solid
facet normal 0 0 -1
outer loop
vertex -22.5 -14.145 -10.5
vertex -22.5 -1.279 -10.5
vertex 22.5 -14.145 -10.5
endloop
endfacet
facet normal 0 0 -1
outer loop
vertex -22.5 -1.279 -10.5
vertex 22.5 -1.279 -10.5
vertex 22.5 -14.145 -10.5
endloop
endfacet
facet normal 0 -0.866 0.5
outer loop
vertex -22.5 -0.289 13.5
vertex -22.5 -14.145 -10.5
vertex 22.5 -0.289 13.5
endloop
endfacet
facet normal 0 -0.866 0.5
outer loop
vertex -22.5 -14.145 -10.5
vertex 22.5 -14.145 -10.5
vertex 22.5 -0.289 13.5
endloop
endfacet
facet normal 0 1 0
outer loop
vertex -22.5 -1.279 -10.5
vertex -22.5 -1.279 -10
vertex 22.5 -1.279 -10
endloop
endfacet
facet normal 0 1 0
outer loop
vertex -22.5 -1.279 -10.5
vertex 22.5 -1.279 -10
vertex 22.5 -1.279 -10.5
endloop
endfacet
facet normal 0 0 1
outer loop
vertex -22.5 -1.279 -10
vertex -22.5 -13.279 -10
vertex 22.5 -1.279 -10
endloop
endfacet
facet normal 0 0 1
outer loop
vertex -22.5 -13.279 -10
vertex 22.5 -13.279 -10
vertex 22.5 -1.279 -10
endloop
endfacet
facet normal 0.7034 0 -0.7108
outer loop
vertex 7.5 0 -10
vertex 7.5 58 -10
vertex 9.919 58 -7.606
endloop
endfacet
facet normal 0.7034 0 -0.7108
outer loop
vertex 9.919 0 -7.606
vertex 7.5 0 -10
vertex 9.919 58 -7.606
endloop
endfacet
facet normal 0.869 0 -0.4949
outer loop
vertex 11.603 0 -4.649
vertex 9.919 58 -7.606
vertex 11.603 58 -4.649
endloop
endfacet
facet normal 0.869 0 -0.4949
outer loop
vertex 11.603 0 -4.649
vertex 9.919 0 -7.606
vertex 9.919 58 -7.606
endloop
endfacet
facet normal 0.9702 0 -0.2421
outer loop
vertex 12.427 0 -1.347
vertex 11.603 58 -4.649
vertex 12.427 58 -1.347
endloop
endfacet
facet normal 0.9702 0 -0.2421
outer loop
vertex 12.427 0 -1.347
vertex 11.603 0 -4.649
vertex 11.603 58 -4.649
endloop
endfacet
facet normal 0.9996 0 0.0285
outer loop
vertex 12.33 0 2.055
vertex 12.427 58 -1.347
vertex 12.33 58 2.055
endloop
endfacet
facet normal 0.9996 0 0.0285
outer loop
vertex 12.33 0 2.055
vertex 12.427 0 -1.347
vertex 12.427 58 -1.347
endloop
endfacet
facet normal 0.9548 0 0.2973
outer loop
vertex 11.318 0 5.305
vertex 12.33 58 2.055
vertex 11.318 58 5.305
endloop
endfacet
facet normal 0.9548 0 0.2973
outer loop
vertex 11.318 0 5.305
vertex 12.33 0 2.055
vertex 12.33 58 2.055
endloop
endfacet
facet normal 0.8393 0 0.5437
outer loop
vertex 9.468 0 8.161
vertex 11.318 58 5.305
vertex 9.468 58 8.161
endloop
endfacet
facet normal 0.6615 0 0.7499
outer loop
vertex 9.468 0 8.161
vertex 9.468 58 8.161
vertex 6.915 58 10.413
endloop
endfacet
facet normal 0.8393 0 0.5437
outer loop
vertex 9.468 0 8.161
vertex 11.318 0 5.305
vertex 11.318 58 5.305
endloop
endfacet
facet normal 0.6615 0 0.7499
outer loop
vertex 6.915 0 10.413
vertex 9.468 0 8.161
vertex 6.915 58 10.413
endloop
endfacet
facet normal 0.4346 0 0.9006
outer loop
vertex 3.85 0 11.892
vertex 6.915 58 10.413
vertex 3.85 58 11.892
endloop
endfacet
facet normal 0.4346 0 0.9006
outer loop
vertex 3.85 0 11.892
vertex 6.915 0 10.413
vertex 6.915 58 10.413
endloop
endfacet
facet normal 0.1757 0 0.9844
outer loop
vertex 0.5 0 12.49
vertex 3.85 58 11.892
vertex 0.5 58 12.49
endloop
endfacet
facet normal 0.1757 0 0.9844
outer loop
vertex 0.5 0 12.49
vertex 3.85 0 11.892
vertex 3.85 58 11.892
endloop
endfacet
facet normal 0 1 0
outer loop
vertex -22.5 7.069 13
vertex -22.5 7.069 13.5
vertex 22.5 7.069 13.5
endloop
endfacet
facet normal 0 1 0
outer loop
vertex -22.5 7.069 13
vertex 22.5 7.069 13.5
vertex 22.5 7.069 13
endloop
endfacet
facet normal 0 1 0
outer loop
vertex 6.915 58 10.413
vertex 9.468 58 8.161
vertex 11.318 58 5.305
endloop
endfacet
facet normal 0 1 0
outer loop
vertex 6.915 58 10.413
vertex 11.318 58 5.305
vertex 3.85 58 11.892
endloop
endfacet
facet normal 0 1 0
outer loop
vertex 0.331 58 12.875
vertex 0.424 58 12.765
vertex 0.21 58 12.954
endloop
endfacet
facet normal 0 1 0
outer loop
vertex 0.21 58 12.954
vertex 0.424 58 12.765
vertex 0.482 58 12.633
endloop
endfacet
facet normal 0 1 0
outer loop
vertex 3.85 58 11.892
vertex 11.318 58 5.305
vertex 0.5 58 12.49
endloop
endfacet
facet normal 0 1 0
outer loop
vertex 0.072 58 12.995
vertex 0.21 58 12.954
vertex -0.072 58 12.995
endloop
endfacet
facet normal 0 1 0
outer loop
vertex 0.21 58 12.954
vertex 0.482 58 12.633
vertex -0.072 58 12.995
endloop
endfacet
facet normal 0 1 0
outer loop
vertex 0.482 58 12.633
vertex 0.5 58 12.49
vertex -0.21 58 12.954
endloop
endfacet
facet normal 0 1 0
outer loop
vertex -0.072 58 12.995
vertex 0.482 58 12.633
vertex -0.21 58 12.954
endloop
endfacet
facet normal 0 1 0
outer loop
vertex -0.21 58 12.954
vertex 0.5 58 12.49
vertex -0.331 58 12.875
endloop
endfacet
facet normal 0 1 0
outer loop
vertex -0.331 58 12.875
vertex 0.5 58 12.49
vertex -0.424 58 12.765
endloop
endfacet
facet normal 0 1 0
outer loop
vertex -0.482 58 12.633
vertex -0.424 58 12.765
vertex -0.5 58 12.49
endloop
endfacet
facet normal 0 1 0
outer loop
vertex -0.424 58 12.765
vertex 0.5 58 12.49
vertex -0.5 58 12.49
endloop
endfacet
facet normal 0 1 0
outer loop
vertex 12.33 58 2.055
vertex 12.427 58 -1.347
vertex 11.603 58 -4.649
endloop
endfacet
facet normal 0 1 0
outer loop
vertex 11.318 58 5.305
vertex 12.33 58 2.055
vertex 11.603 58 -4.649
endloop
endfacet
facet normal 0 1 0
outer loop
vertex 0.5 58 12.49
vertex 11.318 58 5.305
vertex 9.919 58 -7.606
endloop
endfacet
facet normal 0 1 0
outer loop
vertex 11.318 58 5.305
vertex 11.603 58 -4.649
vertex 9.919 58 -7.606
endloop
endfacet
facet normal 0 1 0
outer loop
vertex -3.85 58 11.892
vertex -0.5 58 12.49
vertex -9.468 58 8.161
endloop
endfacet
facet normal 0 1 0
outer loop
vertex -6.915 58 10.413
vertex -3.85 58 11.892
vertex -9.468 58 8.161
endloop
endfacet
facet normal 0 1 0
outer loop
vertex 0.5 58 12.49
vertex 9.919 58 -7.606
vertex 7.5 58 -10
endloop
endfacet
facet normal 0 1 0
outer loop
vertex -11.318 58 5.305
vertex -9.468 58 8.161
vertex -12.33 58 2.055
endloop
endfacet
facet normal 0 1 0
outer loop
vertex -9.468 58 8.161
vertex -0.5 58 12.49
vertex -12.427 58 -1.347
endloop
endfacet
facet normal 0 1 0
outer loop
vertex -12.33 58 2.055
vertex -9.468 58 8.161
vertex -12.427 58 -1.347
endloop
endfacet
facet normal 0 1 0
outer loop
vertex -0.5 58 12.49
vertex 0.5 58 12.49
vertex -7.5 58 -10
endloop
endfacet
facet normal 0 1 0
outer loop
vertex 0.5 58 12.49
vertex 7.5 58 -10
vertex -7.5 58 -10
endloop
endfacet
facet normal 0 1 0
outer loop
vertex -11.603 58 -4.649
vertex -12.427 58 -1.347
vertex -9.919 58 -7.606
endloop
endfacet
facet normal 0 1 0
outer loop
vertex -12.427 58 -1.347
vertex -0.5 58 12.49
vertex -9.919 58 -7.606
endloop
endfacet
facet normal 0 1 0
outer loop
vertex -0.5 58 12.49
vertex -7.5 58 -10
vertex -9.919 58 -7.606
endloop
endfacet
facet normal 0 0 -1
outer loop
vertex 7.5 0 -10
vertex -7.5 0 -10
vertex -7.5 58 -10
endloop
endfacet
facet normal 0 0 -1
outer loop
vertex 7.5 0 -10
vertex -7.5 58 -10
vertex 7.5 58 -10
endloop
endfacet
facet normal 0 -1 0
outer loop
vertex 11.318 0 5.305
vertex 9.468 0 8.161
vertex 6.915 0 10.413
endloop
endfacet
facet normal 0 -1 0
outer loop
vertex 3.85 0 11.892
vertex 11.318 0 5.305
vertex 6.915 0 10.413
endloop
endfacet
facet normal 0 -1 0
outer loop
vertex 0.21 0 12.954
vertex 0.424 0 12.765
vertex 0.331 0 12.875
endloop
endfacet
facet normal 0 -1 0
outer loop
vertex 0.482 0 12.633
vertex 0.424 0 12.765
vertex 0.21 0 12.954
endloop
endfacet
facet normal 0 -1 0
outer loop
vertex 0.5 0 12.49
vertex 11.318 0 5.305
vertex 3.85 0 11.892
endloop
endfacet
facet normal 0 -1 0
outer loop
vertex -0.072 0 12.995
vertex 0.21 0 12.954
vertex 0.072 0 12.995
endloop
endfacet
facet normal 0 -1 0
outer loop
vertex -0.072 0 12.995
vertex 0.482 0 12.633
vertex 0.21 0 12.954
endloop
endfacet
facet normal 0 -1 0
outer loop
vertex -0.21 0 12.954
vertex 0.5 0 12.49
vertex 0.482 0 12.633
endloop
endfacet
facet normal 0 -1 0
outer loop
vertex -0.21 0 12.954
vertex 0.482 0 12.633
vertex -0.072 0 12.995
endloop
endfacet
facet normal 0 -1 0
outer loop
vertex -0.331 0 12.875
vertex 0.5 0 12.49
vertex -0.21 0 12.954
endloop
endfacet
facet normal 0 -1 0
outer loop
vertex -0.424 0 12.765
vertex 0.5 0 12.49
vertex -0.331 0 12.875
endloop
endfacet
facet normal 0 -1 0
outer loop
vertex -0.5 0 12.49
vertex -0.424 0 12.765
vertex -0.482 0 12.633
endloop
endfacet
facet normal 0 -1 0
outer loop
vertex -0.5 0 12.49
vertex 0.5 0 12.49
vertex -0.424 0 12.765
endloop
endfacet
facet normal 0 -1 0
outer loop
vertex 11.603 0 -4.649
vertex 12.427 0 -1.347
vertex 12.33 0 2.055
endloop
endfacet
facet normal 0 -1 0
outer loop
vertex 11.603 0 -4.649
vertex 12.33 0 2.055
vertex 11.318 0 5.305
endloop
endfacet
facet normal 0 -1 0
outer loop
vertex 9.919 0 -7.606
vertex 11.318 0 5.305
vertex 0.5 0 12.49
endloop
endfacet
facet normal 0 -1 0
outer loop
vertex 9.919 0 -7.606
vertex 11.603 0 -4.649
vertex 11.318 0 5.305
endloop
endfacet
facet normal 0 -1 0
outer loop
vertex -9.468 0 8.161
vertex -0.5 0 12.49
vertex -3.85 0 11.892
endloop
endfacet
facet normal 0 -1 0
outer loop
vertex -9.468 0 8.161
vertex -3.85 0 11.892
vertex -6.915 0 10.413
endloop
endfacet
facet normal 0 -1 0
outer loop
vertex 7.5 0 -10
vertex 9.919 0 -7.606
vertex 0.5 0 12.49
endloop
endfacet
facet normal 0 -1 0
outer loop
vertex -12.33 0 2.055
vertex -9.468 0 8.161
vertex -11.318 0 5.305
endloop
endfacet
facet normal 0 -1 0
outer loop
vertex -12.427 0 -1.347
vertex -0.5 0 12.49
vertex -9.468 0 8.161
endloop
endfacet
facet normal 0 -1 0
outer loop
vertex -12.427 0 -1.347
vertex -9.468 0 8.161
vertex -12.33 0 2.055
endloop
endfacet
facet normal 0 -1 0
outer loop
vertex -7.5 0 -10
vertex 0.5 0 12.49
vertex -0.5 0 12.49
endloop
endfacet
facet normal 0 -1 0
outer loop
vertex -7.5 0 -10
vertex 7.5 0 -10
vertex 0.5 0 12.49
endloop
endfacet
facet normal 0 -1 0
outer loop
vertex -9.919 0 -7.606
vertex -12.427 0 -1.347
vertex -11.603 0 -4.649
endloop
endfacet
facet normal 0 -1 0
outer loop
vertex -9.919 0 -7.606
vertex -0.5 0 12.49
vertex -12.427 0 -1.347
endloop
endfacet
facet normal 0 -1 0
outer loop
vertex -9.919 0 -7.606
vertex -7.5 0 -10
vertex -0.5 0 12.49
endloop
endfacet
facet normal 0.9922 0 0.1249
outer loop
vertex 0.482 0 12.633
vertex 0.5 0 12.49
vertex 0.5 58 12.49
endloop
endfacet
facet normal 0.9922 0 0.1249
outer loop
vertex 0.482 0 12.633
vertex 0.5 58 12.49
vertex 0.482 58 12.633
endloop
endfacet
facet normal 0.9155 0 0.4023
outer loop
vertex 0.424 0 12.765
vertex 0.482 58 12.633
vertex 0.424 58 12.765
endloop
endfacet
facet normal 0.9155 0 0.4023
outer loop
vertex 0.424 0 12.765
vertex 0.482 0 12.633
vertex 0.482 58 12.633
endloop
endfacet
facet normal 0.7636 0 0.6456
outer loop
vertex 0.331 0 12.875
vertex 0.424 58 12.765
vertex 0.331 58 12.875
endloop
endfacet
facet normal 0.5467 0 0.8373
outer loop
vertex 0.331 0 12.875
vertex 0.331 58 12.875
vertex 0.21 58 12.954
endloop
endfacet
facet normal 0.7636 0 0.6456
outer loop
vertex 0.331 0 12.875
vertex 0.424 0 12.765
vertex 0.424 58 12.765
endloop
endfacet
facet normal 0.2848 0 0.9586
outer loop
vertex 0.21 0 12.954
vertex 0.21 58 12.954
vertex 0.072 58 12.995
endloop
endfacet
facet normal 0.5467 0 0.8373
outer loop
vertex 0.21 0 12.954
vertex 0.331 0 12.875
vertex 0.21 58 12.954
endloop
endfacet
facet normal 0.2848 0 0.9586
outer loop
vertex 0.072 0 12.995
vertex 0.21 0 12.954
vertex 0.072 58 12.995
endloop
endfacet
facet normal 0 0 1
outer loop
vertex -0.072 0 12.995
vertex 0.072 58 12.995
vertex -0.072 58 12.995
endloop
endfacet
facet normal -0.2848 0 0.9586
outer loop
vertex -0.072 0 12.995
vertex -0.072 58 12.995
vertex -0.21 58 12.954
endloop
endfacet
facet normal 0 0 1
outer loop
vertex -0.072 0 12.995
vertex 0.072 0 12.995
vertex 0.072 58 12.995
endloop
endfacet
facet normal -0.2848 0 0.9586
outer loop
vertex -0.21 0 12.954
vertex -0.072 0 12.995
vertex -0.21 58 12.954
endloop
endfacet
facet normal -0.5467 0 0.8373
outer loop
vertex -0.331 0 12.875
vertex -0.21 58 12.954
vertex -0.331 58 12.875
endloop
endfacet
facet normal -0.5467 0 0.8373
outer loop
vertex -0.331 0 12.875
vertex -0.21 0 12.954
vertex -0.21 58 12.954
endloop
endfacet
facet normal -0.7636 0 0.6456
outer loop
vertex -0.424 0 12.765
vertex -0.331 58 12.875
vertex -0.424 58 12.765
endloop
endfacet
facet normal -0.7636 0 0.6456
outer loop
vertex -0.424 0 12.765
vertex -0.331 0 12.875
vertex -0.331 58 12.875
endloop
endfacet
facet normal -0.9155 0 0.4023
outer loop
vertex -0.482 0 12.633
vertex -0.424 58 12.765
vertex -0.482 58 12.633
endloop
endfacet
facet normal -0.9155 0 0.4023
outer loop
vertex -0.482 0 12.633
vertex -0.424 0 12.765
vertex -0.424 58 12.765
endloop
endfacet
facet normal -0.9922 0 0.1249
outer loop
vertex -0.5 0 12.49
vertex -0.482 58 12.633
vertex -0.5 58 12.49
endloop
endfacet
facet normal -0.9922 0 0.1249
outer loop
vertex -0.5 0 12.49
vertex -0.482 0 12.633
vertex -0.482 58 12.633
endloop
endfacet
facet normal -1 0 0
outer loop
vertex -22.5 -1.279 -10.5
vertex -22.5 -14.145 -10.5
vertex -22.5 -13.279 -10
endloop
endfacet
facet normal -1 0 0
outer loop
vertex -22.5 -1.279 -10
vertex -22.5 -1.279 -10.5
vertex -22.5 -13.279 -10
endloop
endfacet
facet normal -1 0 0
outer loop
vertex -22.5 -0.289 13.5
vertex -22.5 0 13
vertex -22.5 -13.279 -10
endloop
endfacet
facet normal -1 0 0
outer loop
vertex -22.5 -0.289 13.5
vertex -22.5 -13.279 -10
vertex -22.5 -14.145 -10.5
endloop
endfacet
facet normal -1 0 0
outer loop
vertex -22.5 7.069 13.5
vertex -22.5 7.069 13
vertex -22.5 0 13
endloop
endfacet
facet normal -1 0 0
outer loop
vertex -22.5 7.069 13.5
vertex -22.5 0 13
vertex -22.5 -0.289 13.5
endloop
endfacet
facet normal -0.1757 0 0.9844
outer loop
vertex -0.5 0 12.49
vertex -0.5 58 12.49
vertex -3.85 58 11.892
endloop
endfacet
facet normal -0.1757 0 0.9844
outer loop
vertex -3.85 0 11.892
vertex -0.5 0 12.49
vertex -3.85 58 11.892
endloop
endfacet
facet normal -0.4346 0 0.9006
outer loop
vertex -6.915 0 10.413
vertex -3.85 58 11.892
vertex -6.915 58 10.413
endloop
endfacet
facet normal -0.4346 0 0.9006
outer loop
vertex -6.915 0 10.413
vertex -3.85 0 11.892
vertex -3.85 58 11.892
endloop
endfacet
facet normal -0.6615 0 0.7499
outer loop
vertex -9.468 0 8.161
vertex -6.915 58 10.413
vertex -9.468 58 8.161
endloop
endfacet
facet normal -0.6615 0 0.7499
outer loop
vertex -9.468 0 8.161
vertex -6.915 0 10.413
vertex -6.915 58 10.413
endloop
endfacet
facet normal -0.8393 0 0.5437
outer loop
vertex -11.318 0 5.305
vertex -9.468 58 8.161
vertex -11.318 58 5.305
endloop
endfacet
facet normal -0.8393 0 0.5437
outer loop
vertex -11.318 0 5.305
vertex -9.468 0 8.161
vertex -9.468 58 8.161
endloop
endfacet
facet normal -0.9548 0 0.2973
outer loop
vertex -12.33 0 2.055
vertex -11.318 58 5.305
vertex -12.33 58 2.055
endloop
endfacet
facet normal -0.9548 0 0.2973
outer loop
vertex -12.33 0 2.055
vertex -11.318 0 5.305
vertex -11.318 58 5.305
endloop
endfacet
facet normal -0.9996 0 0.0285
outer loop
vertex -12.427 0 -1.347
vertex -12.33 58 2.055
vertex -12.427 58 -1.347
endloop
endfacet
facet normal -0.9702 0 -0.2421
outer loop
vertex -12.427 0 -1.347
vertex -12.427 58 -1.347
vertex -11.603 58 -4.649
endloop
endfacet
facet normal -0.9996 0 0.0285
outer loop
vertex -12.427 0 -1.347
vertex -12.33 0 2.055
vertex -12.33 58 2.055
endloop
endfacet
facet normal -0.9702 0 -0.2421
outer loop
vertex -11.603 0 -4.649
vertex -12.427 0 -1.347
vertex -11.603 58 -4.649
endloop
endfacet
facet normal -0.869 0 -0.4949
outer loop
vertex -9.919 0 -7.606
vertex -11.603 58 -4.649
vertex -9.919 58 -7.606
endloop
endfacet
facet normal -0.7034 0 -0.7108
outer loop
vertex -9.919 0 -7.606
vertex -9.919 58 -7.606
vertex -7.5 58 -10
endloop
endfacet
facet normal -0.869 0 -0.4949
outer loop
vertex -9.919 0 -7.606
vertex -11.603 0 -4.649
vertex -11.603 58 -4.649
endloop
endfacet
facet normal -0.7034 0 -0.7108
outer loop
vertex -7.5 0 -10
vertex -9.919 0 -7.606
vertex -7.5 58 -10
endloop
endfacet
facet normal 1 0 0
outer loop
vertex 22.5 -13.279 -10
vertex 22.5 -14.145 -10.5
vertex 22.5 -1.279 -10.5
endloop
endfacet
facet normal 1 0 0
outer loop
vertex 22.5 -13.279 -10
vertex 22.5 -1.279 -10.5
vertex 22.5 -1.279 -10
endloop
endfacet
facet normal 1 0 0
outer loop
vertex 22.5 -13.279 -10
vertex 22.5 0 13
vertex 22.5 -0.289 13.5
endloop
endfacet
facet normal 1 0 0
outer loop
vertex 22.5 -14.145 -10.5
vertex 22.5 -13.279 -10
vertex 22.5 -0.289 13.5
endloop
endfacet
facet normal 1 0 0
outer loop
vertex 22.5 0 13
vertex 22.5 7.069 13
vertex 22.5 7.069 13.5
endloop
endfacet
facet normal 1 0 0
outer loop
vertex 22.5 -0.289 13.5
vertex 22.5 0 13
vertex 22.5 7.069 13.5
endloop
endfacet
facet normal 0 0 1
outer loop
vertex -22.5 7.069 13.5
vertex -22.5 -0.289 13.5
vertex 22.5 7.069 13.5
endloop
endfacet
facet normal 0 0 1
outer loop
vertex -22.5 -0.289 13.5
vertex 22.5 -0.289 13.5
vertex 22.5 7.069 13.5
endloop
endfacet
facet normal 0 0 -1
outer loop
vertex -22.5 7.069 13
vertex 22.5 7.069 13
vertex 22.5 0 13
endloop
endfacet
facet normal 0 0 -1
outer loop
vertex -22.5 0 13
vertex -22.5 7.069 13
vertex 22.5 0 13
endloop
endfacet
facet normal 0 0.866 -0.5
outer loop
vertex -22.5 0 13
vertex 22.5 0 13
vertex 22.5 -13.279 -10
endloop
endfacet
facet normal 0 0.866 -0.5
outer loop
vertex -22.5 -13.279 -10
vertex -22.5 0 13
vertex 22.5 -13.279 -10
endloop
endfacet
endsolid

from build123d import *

# Parameters (mm, degrees)
EXTRUDE_1_DEPTH = 58
EXTRUDE_2_DEPTH = 22.5


with BuildPart() as part:
    # 草图1 → 凸台-拉伸1 (new body)
    with BuildSketch(Plane(origin=(0, 0, 0), x_dir=(1, 0, 0), z_dir=(0, 1, 0))):
        with BuildLine():
            Line((-7.5, 10), (7.5, 10))
            ThreePointArc((7.5, 10), (11.935226222, -3.714885602), (0.49989999, -12.49))
            ThreePointArc((0.49989999, -12.49), (0, -13), (-0.49989999, -12.49))
            ThreePointArc((-0.49989999, -12.49), (-11.935226222, -3.714885602), (-7.5, 10))
        make_face()
    extrude(amount=EXTRUDE_1_DEPTH)


with BuildPart() as body_2:
    # 草图2 → 凸台-拉伸2 (new, symmetric)
    with BuildSketch(Plane(origin=(0, 0, 0), x_dir=(0, 0, -1), z_dir=(1, 0, 0))):
        Polygon((-13, 0), (10, -13.279056191), (10, -1.279056191), (10.5, -1.279056191), (10.5, -14.145081595), (-13.5, -0.288675135), (-13.5, 7.068703683), (-13, 7.068703683), align=None)
    extrude(amount=EXTRUDE_2_DEPTH, both=True)


solid = Compound([part.part, body_2.part])
